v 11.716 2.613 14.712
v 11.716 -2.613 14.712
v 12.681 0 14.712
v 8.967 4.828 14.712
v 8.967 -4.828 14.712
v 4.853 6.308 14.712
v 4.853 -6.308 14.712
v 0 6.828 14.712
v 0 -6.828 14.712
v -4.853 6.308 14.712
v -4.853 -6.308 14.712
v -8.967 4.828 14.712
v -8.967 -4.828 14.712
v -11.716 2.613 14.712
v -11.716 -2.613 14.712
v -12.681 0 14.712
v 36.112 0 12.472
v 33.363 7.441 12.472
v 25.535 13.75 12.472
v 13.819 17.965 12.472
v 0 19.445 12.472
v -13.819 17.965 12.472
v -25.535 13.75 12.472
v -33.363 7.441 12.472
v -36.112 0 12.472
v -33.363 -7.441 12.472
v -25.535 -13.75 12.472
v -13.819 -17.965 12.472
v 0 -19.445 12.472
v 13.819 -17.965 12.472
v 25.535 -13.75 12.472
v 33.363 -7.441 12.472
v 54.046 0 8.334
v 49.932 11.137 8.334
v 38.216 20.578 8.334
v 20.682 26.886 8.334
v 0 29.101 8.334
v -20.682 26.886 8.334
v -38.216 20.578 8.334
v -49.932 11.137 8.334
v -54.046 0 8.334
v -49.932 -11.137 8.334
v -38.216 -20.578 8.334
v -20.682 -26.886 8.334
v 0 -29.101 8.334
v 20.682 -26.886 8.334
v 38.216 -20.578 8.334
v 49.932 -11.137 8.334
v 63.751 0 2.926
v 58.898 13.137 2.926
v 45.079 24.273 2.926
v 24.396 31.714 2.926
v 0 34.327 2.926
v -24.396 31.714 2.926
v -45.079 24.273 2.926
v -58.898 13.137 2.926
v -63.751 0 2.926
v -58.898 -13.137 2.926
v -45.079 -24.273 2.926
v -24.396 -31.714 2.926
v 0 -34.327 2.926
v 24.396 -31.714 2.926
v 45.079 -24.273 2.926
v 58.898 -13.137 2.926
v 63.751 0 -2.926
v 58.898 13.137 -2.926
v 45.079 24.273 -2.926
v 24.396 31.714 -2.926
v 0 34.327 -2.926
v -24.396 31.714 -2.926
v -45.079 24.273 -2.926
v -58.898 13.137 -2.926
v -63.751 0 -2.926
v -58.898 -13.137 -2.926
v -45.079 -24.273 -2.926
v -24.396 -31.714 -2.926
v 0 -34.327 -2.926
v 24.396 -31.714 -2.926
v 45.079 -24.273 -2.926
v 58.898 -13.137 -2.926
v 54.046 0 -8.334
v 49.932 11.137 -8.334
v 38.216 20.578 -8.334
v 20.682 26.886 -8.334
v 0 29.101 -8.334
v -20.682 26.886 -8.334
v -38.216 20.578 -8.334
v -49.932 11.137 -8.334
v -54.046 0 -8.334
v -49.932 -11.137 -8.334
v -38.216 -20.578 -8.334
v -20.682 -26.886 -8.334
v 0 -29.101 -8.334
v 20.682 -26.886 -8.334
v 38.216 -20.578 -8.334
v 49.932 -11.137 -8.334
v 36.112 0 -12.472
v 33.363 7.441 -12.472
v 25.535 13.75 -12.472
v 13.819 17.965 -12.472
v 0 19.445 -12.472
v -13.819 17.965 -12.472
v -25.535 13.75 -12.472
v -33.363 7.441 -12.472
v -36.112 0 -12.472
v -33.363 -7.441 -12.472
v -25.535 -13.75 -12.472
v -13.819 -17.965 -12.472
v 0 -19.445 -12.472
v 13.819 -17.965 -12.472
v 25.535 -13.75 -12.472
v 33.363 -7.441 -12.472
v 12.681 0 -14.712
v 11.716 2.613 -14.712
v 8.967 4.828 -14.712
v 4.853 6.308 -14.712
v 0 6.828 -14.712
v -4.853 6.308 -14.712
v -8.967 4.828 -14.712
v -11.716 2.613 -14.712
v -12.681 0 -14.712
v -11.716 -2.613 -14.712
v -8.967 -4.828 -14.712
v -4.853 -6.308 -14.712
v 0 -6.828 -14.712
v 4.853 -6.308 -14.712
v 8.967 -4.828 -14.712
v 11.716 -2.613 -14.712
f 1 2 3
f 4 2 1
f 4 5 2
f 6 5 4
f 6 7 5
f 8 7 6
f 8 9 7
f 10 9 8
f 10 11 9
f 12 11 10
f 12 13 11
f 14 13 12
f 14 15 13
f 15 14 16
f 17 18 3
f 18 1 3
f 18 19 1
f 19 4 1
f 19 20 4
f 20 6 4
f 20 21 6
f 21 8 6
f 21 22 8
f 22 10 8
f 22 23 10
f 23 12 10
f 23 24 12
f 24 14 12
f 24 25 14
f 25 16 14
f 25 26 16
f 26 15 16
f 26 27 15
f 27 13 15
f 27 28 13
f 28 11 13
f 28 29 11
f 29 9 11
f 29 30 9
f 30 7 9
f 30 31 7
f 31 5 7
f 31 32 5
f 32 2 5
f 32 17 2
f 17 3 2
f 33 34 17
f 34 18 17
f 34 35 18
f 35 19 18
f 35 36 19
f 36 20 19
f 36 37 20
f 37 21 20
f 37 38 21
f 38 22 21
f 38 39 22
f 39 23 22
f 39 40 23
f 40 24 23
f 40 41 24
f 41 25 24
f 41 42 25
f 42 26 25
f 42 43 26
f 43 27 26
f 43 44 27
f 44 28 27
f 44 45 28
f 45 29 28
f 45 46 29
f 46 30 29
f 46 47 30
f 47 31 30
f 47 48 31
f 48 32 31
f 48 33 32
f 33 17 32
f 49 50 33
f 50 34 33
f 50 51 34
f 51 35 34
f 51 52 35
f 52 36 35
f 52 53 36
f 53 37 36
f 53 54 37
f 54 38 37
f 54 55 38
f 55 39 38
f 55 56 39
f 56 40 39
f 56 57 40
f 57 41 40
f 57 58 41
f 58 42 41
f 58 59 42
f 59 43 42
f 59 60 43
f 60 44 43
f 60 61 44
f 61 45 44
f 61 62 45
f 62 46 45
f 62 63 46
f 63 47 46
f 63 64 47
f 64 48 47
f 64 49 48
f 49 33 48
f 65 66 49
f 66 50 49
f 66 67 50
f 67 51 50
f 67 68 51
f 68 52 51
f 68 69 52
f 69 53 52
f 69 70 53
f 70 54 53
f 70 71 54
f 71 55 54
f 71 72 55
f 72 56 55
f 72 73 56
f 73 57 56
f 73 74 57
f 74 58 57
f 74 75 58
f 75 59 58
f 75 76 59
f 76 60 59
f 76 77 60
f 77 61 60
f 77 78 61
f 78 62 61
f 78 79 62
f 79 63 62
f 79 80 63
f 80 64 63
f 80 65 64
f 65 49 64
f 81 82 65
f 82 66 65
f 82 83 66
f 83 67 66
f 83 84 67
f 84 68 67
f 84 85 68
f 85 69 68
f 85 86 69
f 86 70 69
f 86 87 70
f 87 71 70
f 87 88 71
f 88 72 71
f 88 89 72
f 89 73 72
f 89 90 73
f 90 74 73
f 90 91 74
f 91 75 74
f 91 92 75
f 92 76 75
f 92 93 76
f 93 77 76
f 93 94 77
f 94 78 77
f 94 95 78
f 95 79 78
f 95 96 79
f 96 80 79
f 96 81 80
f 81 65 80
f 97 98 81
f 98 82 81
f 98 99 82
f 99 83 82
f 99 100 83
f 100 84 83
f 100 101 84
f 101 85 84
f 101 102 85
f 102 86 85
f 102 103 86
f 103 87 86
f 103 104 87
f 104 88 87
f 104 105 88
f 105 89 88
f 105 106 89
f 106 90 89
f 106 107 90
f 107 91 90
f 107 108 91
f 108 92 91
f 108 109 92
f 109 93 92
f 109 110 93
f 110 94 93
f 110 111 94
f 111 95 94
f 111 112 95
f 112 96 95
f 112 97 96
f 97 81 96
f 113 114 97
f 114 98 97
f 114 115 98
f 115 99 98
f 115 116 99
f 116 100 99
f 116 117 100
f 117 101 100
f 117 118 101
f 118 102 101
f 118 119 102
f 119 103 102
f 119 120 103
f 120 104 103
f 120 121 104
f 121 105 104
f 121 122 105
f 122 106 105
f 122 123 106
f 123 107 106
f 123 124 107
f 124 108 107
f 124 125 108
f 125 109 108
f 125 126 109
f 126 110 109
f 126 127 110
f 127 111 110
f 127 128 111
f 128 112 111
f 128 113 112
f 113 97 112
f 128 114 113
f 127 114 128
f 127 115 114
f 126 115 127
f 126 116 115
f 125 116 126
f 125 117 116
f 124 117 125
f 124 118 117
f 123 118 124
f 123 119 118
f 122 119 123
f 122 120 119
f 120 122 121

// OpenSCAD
// Generated by SolidPython 1.0.1 on 2020-07-29 00:46:50


scale(v = [13, 7, 3]) {
	sphere(r = 5);
}
/***********************************************
*********      SolidPython code:      **********
************************************************
 
# import packages: SolidPython
from solid import *
from solid.utils import *
from itertools import chain, combinations, permutations


class Resize:

    def __init__(self, scad_file):
        self.scad_file = scad_file
        #self.scad_file = import_scad(scad_file)
        # cone/cylinder param:
        self.r1 = 0
        self.r2 = 0
        self.h = 0
        # rectangular prism param:
        self.w = 0
        self.l = 0
        # ellipse param:
        self.r = 0

    # import OpenScad code (file name corresponds to shape)


    # classify shape + parameters
    def assign(self, param1, param2, param3):
        if self.scad_file == 'cone.scad':
            self.r1 = param1
            self.r2 = param2
            self.h = param3
        elif self.scad_file == 'cylinder.scad':
            self.r1 = param1
            self.r2 = param2
            self.h = param3
        elif self.scad_file == 'rectangularPrism.scad':
            self.h = param1
            self.l = param2
            self.w = param3
        else:
            self.r = param1
            self.h = param2

    # resize parameters
    def iterate(self):
        x = range(3, 20, 2)
        i = 1
        if self.scad_file == 'cone.scad':
            tempList = list(permutations(x, 2))
            for temp in tempList:
                param1 = temp[0]
                param2 = temp[1]
                filepath = 'produced_scad_files/' + 'cone' + str(param1) + '_' + str(param2) + '_' + '.scad'
                scad_render_to_file(cylinder(h=param1, r1=param2, r2=0), filepath)

        elif self.scad_file == 'cylinder.scad':
            tempList = list(permutations(x, 3))
            for temp in tempList:
                param1 = temp[0]
                param2 = temp[1]
                filepath = 'produced_scad_files/' + 'cylinder' + str(param1) + '_' + str(param2) + '_' + '.scad'
                scad_render_to_file(cylinder(h=param1, r1=param2, r2=param2), filepath)

        elif self.scad_file == 'rectangularPrism.scad':
            tempList = list(permutations(x, 3))
            for temp in tempList:
                param1 = temp[0]
                param2 = temp[1]
                param3 = temp[2]
                filepath = 'produced_scad_files/' + 'rectangularPrism' + str(param1) + '_' + str(param2) + '_' + str(
                    param3) + '.scad'
                scad_render_to_file(cube(size=(param1, param2, param3)), filepath)

        elif self.scad_file == 'ellipse.scad':
            tempList = list(permutations(x, 4))
            for temp in tempList:
                param1 = temp[0]
                param2 = temp[1]
                param3 = temp[2]
                param4 = temp[3]
                filepath = 'produced_scad_files/' + 'ellipse' + str(param1) + '_' + str(param2) + '_' + str(param3) + '_' + str(param4) + '.scad'
                scad_render_to_file(scale([param1, param2, param3])(sphere(r=param4)), filepath)

    def render_to_scadfile(self):
        scad_render_to_file(scad, 'example.scad') 
 
************************************************/
